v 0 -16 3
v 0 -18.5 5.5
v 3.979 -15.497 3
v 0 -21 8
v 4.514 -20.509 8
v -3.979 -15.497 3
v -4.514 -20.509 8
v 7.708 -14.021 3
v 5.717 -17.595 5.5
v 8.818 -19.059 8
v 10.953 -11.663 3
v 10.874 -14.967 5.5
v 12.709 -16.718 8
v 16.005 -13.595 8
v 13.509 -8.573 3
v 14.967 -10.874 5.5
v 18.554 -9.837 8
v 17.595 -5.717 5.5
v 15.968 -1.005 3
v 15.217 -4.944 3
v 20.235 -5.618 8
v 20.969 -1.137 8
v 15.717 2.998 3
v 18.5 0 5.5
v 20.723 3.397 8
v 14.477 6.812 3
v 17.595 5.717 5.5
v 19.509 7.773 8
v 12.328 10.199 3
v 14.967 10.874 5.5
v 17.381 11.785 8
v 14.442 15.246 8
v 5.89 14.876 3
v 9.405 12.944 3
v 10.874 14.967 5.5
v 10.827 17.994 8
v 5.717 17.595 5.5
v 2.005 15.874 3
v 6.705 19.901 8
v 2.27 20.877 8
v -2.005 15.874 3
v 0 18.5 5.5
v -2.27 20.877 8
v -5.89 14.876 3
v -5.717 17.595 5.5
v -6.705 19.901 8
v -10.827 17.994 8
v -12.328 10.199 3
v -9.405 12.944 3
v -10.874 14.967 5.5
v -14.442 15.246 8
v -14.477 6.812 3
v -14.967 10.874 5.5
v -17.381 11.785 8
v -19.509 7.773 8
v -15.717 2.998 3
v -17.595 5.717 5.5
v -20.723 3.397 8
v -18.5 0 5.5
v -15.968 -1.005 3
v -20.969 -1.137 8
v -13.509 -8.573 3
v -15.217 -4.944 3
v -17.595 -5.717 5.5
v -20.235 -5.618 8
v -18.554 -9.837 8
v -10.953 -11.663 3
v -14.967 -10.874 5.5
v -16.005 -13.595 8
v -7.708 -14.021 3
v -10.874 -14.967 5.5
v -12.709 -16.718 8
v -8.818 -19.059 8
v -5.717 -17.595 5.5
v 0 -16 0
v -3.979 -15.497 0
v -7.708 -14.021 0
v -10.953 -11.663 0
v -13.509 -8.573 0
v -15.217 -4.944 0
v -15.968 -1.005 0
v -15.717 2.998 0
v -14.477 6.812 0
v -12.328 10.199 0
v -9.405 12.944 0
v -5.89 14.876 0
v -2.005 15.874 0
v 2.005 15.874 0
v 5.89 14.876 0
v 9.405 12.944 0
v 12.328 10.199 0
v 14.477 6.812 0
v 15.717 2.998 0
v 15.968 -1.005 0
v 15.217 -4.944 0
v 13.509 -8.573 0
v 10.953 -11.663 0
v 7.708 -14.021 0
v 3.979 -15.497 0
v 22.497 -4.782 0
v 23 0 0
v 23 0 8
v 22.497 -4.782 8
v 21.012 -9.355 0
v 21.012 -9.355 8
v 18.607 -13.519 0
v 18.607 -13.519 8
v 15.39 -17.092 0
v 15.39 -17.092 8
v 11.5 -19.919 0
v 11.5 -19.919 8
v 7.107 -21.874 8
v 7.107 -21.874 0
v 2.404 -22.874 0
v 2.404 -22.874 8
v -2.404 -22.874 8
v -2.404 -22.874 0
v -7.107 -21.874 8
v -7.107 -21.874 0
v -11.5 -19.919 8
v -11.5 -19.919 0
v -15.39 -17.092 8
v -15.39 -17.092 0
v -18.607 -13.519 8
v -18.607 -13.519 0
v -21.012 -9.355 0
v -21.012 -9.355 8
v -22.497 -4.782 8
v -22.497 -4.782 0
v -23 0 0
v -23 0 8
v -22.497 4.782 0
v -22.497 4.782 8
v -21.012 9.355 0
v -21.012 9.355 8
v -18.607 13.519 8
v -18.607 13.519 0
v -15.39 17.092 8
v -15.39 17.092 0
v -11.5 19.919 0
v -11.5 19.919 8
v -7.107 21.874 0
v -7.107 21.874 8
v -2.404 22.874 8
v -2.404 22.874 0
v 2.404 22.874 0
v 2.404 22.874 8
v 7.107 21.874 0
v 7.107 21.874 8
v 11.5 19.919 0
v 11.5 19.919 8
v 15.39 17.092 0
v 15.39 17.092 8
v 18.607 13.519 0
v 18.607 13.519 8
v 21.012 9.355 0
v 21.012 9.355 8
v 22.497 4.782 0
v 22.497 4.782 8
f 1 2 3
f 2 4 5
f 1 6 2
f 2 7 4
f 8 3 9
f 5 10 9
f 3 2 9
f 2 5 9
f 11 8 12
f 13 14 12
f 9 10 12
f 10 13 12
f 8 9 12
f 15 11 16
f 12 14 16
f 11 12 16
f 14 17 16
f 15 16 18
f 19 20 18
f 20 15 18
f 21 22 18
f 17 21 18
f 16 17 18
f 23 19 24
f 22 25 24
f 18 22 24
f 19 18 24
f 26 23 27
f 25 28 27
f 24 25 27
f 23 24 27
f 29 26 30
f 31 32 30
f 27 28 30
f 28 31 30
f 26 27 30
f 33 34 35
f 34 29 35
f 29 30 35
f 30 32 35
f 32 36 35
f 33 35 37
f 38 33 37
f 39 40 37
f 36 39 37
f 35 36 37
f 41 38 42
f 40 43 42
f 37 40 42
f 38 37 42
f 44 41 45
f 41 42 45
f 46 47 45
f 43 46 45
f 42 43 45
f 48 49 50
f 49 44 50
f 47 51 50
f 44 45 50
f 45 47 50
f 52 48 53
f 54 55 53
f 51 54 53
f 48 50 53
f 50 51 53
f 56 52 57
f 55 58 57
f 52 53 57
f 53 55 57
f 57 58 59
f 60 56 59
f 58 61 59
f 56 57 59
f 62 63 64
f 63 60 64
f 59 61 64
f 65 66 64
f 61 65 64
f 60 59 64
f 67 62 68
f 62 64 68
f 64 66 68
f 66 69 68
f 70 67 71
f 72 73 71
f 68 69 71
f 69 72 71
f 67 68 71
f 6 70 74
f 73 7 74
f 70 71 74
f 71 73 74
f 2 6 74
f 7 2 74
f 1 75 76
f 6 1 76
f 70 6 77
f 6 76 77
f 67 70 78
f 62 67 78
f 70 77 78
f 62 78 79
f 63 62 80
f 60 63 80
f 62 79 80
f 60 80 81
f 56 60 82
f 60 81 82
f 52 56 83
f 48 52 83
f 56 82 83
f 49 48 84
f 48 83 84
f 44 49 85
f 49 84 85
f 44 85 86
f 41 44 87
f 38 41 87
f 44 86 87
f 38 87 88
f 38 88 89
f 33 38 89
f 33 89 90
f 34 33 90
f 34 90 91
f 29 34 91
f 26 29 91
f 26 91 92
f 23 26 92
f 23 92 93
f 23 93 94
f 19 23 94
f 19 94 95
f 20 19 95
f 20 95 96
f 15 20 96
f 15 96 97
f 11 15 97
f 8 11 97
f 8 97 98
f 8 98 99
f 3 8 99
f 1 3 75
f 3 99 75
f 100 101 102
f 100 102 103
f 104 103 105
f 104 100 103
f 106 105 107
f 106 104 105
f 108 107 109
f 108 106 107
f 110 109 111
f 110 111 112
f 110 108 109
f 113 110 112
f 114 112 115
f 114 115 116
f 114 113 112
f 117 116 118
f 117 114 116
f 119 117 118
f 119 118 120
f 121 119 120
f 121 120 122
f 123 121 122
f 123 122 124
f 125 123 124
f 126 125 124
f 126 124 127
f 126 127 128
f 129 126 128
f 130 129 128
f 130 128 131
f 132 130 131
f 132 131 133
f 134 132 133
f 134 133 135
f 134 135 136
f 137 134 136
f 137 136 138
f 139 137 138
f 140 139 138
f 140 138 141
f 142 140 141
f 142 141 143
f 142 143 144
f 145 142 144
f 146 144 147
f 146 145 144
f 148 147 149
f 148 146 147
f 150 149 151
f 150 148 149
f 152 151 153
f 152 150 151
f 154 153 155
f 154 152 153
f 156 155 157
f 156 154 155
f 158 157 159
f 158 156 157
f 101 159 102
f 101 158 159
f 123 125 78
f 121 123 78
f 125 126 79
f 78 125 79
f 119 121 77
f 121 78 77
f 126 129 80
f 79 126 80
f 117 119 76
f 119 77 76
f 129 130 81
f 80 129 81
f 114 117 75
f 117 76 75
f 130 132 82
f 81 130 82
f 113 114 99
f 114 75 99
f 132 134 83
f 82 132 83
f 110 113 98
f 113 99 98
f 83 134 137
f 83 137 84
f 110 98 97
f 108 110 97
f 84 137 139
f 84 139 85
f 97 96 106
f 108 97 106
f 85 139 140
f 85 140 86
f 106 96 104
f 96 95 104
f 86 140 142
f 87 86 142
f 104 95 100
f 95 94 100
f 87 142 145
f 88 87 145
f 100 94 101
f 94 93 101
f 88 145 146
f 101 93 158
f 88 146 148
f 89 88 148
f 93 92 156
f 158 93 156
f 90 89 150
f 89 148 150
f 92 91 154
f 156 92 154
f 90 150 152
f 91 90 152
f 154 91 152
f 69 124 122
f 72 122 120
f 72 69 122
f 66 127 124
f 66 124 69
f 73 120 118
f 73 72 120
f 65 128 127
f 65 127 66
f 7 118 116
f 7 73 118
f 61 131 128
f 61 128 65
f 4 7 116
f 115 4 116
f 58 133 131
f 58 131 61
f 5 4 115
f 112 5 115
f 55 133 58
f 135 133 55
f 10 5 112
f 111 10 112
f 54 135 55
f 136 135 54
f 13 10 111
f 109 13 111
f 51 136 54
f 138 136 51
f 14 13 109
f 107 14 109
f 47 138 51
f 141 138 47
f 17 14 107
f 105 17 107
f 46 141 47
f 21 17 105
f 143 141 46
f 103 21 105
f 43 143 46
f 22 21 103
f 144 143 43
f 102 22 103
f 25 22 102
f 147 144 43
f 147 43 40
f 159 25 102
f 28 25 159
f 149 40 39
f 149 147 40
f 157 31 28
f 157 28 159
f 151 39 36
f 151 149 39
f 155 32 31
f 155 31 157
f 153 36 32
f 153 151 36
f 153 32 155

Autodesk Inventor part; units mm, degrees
ref_plane "YZ Plane" through (0, 0, 0) normal (1, 0, 0) x (0, 1, 0)
ref_plane "XZ Plane" through (0, 0, 0) normal (0, 1, 0) x (-1, 0, 0)
ref_plane "XY Plane" through (0, 0, 0) normal (0, 0, 1) x (1, 0, 0)
sketch "Sketch1" plane through (0, 0, 0) normal (0, 0, 1) x (1, 0, 0)
  line L0 (-27.6, 0) -> (36.8, 0) projected
  line L1 (0, -27.6) -> (0, 36.8) projected
  circle A0 centre (0, 0) radius 23
  dimension "d0" = 46
extrude "Extrusion1" add sketch "Sketch1" along normal blind 8
sketch "Sketch3" plane through (0, 0, 8) normal (0, 0, 1) x (1, 0, 0)
  circle A0 centre (0, 0) radius 23 projected
hole "Hole1" at (0, 0, 8) direction (0, 0, -1) diameter 32 end through all
chamfer "Chamfer1" distance 5 angle 45 1 edges at (0, 16, 8)
properties part number "Bumper" material "Silicone"
